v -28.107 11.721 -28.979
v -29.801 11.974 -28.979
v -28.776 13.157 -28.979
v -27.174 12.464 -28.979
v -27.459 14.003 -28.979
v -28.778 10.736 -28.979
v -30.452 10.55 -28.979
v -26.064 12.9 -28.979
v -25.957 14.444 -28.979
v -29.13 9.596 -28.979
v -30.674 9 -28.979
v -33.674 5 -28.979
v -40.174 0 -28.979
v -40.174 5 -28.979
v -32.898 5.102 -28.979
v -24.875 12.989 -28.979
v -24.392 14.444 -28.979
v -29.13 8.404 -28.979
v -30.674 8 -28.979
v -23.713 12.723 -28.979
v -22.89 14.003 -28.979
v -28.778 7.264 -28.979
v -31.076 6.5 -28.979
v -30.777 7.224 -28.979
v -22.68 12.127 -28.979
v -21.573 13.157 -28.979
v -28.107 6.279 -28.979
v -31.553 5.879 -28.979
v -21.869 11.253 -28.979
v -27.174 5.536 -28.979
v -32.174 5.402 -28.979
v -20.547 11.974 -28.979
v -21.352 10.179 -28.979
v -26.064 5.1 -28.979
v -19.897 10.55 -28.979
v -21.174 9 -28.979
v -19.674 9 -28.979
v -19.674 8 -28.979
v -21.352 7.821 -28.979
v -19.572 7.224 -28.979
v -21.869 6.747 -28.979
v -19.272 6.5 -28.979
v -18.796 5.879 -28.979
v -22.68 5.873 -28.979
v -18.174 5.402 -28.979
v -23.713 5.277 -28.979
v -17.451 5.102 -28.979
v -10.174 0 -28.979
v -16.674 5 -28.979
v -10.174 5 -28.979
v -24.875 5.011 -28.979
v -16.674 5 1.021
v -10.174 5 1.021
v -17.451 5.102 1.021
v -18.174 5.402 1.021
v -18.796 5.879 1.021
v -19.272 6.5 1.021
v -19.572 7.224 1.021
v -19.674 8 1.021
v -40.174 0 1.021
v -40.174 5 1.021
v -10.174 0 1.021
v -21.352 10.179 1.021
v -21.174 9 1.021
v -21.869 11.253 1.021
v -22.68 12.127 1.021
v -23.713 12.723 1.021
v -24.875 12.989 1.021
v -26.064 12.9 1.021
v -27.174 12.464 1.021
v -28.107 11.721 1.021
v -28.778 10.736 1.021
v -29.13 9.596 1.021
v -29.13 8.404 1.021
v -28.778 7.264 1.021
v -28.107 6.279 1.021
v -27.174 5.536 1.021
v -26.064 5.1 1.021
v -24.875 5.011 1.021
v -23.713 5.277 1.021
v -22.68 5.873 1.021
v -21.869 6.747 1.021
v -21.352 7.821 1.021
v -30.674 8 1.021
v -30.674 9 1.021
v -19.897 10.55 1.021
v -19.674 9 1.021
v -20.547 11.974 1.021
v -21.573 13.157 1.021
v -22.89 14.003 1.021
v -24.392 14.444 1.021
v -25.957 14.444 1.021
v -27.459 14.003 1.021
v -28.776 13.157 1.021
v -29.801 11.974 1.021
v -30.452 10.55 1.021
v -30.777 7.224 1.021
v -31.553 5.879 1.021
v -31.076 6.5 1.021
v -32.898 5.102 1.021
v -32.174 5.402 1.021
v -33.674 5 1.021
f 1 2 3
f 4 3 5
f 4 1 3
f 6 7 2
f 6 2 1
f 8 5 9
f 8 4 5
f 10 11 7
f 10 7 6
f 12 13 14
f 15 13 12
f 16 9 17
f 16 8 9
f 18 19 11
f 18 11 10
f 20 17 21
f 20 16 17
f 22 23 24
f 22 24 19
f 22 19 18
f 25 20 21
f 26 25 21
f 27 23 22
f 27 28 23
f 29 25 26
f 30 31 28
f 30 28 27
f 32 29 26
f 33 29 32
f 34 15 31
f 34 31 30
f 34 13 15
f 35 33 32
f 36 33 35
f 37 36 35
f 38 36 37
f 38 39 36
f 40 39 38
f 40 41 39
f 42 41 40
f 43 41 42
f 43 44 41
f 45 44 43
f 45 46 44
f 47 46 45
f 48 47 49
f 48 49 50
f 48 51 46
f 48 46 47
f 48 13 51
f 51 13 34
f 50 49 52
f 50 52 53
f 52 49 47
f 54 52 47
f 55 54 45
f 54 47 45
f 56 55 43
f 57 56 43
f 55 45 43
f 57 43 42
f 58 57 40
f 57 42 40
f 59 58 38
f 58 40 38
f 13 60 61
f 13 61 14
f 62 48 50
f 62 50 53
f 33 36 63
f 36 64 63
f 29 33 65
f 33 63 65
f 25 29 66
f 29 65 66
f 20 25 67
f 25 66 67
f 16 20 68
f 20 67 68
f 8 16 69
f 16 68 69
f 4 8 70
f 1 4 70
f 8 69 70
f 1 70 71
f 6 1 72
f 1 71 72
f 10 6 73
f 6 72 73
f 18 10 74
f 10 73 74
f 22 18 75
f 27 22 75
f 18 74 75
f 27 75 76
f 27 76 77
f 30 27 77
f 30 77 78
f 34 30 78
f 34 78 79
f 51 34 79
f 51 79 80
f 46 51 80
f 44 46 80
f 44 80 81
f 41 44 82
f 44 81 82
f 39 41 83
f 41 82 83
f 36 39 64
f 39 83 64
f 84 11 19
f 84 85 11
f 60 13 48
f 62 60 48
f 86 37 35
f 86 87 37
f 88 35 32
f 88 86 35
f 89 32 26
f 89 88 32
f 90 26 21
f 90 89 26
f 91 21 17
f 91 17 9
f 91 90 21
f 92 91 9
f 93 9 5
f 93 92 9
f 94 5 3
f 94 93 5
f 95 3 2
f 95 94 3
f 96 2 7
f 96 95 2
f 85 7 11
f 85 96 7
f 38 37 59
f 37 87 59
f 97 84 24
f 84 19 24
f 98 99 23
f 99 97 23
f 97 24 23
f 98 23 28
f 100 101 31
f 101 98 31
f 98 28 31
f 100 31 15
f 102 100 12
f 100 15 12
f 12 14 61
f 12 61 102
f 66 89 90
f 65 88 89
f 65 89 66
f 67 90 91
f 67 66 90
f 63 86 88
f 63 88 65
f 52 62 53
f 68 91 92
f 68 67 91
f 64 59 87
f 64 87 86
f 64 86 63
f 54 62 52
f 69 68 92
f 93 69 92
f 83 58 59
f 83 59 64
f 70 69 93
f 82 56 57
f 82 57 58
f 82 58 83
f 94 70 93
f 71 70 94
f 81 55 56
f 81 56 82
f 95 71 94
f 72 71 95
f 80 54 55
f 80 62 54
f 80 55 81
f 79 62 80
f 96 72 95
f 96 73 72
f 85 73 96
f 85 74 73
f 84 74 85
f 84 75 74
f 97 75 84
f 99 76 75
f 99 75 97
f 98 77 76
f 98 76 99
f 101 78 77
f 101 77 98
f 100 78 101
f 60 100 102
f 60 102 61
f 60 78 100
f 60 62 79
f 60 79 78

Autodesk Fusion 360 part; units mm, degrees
sketch "Sketch1" plane through (0, 0, 0) normal (0, 1, 0) x (1, 0, 0)
  line L0 (-40.1743, 28.9794) -> (-10.1743, 28.9794)
  line L1 (-10.1743, 28.9794) -> (-10.1743, -1.0206)
  line L2 (-10.1743, -1.0206) -> (-40.1743, -1.0206)
  line L3 (-40.1743, -1.0206) -> (-40.1743, 28.9794)
  dimension "d1" = 30
  dimension "d2" = 30
extrude "Extrude1" add sketch "Sketch1" along normal blind 5
sketch "Sketch2" plane through (0, 0, 1.0206) normal (0, 0, 1) x (1, 0, 0)
  line L0 (-40.1743, 0) -> (-10.1743, 0)
  line L1 (-10.1743, 0) -> (-10.1743, 5)
  line L2 (-10.1743, 5) -> (-40.1743, 5)
  line L3 (-40.1743, 5) -> (-40.1743, 0)
  circle A0 centre (-25.1743, 9) radius 4
  circle A1 centre (-25.1743, 9) radius 5.5
  line L4 (-19.6743, 9) -> (-19.6743, 5)
  line L5 (-30.6743, 9) -> (-30.6743, 4.9999)
  dimension "d8" = 8
  dimension "d9" = 11
extrude "Extrude2" add sketch "Sketch2" against normal blind 30 contours L2 A1 L5 | L2 A1 L4 | L2 A1 picked at (-30.1523, 9.3387)
fillet "Fillet1" radius 3 2 edges at (-19.6743, 5, -13.9794) (-30.6743, 5, -13.9794)
